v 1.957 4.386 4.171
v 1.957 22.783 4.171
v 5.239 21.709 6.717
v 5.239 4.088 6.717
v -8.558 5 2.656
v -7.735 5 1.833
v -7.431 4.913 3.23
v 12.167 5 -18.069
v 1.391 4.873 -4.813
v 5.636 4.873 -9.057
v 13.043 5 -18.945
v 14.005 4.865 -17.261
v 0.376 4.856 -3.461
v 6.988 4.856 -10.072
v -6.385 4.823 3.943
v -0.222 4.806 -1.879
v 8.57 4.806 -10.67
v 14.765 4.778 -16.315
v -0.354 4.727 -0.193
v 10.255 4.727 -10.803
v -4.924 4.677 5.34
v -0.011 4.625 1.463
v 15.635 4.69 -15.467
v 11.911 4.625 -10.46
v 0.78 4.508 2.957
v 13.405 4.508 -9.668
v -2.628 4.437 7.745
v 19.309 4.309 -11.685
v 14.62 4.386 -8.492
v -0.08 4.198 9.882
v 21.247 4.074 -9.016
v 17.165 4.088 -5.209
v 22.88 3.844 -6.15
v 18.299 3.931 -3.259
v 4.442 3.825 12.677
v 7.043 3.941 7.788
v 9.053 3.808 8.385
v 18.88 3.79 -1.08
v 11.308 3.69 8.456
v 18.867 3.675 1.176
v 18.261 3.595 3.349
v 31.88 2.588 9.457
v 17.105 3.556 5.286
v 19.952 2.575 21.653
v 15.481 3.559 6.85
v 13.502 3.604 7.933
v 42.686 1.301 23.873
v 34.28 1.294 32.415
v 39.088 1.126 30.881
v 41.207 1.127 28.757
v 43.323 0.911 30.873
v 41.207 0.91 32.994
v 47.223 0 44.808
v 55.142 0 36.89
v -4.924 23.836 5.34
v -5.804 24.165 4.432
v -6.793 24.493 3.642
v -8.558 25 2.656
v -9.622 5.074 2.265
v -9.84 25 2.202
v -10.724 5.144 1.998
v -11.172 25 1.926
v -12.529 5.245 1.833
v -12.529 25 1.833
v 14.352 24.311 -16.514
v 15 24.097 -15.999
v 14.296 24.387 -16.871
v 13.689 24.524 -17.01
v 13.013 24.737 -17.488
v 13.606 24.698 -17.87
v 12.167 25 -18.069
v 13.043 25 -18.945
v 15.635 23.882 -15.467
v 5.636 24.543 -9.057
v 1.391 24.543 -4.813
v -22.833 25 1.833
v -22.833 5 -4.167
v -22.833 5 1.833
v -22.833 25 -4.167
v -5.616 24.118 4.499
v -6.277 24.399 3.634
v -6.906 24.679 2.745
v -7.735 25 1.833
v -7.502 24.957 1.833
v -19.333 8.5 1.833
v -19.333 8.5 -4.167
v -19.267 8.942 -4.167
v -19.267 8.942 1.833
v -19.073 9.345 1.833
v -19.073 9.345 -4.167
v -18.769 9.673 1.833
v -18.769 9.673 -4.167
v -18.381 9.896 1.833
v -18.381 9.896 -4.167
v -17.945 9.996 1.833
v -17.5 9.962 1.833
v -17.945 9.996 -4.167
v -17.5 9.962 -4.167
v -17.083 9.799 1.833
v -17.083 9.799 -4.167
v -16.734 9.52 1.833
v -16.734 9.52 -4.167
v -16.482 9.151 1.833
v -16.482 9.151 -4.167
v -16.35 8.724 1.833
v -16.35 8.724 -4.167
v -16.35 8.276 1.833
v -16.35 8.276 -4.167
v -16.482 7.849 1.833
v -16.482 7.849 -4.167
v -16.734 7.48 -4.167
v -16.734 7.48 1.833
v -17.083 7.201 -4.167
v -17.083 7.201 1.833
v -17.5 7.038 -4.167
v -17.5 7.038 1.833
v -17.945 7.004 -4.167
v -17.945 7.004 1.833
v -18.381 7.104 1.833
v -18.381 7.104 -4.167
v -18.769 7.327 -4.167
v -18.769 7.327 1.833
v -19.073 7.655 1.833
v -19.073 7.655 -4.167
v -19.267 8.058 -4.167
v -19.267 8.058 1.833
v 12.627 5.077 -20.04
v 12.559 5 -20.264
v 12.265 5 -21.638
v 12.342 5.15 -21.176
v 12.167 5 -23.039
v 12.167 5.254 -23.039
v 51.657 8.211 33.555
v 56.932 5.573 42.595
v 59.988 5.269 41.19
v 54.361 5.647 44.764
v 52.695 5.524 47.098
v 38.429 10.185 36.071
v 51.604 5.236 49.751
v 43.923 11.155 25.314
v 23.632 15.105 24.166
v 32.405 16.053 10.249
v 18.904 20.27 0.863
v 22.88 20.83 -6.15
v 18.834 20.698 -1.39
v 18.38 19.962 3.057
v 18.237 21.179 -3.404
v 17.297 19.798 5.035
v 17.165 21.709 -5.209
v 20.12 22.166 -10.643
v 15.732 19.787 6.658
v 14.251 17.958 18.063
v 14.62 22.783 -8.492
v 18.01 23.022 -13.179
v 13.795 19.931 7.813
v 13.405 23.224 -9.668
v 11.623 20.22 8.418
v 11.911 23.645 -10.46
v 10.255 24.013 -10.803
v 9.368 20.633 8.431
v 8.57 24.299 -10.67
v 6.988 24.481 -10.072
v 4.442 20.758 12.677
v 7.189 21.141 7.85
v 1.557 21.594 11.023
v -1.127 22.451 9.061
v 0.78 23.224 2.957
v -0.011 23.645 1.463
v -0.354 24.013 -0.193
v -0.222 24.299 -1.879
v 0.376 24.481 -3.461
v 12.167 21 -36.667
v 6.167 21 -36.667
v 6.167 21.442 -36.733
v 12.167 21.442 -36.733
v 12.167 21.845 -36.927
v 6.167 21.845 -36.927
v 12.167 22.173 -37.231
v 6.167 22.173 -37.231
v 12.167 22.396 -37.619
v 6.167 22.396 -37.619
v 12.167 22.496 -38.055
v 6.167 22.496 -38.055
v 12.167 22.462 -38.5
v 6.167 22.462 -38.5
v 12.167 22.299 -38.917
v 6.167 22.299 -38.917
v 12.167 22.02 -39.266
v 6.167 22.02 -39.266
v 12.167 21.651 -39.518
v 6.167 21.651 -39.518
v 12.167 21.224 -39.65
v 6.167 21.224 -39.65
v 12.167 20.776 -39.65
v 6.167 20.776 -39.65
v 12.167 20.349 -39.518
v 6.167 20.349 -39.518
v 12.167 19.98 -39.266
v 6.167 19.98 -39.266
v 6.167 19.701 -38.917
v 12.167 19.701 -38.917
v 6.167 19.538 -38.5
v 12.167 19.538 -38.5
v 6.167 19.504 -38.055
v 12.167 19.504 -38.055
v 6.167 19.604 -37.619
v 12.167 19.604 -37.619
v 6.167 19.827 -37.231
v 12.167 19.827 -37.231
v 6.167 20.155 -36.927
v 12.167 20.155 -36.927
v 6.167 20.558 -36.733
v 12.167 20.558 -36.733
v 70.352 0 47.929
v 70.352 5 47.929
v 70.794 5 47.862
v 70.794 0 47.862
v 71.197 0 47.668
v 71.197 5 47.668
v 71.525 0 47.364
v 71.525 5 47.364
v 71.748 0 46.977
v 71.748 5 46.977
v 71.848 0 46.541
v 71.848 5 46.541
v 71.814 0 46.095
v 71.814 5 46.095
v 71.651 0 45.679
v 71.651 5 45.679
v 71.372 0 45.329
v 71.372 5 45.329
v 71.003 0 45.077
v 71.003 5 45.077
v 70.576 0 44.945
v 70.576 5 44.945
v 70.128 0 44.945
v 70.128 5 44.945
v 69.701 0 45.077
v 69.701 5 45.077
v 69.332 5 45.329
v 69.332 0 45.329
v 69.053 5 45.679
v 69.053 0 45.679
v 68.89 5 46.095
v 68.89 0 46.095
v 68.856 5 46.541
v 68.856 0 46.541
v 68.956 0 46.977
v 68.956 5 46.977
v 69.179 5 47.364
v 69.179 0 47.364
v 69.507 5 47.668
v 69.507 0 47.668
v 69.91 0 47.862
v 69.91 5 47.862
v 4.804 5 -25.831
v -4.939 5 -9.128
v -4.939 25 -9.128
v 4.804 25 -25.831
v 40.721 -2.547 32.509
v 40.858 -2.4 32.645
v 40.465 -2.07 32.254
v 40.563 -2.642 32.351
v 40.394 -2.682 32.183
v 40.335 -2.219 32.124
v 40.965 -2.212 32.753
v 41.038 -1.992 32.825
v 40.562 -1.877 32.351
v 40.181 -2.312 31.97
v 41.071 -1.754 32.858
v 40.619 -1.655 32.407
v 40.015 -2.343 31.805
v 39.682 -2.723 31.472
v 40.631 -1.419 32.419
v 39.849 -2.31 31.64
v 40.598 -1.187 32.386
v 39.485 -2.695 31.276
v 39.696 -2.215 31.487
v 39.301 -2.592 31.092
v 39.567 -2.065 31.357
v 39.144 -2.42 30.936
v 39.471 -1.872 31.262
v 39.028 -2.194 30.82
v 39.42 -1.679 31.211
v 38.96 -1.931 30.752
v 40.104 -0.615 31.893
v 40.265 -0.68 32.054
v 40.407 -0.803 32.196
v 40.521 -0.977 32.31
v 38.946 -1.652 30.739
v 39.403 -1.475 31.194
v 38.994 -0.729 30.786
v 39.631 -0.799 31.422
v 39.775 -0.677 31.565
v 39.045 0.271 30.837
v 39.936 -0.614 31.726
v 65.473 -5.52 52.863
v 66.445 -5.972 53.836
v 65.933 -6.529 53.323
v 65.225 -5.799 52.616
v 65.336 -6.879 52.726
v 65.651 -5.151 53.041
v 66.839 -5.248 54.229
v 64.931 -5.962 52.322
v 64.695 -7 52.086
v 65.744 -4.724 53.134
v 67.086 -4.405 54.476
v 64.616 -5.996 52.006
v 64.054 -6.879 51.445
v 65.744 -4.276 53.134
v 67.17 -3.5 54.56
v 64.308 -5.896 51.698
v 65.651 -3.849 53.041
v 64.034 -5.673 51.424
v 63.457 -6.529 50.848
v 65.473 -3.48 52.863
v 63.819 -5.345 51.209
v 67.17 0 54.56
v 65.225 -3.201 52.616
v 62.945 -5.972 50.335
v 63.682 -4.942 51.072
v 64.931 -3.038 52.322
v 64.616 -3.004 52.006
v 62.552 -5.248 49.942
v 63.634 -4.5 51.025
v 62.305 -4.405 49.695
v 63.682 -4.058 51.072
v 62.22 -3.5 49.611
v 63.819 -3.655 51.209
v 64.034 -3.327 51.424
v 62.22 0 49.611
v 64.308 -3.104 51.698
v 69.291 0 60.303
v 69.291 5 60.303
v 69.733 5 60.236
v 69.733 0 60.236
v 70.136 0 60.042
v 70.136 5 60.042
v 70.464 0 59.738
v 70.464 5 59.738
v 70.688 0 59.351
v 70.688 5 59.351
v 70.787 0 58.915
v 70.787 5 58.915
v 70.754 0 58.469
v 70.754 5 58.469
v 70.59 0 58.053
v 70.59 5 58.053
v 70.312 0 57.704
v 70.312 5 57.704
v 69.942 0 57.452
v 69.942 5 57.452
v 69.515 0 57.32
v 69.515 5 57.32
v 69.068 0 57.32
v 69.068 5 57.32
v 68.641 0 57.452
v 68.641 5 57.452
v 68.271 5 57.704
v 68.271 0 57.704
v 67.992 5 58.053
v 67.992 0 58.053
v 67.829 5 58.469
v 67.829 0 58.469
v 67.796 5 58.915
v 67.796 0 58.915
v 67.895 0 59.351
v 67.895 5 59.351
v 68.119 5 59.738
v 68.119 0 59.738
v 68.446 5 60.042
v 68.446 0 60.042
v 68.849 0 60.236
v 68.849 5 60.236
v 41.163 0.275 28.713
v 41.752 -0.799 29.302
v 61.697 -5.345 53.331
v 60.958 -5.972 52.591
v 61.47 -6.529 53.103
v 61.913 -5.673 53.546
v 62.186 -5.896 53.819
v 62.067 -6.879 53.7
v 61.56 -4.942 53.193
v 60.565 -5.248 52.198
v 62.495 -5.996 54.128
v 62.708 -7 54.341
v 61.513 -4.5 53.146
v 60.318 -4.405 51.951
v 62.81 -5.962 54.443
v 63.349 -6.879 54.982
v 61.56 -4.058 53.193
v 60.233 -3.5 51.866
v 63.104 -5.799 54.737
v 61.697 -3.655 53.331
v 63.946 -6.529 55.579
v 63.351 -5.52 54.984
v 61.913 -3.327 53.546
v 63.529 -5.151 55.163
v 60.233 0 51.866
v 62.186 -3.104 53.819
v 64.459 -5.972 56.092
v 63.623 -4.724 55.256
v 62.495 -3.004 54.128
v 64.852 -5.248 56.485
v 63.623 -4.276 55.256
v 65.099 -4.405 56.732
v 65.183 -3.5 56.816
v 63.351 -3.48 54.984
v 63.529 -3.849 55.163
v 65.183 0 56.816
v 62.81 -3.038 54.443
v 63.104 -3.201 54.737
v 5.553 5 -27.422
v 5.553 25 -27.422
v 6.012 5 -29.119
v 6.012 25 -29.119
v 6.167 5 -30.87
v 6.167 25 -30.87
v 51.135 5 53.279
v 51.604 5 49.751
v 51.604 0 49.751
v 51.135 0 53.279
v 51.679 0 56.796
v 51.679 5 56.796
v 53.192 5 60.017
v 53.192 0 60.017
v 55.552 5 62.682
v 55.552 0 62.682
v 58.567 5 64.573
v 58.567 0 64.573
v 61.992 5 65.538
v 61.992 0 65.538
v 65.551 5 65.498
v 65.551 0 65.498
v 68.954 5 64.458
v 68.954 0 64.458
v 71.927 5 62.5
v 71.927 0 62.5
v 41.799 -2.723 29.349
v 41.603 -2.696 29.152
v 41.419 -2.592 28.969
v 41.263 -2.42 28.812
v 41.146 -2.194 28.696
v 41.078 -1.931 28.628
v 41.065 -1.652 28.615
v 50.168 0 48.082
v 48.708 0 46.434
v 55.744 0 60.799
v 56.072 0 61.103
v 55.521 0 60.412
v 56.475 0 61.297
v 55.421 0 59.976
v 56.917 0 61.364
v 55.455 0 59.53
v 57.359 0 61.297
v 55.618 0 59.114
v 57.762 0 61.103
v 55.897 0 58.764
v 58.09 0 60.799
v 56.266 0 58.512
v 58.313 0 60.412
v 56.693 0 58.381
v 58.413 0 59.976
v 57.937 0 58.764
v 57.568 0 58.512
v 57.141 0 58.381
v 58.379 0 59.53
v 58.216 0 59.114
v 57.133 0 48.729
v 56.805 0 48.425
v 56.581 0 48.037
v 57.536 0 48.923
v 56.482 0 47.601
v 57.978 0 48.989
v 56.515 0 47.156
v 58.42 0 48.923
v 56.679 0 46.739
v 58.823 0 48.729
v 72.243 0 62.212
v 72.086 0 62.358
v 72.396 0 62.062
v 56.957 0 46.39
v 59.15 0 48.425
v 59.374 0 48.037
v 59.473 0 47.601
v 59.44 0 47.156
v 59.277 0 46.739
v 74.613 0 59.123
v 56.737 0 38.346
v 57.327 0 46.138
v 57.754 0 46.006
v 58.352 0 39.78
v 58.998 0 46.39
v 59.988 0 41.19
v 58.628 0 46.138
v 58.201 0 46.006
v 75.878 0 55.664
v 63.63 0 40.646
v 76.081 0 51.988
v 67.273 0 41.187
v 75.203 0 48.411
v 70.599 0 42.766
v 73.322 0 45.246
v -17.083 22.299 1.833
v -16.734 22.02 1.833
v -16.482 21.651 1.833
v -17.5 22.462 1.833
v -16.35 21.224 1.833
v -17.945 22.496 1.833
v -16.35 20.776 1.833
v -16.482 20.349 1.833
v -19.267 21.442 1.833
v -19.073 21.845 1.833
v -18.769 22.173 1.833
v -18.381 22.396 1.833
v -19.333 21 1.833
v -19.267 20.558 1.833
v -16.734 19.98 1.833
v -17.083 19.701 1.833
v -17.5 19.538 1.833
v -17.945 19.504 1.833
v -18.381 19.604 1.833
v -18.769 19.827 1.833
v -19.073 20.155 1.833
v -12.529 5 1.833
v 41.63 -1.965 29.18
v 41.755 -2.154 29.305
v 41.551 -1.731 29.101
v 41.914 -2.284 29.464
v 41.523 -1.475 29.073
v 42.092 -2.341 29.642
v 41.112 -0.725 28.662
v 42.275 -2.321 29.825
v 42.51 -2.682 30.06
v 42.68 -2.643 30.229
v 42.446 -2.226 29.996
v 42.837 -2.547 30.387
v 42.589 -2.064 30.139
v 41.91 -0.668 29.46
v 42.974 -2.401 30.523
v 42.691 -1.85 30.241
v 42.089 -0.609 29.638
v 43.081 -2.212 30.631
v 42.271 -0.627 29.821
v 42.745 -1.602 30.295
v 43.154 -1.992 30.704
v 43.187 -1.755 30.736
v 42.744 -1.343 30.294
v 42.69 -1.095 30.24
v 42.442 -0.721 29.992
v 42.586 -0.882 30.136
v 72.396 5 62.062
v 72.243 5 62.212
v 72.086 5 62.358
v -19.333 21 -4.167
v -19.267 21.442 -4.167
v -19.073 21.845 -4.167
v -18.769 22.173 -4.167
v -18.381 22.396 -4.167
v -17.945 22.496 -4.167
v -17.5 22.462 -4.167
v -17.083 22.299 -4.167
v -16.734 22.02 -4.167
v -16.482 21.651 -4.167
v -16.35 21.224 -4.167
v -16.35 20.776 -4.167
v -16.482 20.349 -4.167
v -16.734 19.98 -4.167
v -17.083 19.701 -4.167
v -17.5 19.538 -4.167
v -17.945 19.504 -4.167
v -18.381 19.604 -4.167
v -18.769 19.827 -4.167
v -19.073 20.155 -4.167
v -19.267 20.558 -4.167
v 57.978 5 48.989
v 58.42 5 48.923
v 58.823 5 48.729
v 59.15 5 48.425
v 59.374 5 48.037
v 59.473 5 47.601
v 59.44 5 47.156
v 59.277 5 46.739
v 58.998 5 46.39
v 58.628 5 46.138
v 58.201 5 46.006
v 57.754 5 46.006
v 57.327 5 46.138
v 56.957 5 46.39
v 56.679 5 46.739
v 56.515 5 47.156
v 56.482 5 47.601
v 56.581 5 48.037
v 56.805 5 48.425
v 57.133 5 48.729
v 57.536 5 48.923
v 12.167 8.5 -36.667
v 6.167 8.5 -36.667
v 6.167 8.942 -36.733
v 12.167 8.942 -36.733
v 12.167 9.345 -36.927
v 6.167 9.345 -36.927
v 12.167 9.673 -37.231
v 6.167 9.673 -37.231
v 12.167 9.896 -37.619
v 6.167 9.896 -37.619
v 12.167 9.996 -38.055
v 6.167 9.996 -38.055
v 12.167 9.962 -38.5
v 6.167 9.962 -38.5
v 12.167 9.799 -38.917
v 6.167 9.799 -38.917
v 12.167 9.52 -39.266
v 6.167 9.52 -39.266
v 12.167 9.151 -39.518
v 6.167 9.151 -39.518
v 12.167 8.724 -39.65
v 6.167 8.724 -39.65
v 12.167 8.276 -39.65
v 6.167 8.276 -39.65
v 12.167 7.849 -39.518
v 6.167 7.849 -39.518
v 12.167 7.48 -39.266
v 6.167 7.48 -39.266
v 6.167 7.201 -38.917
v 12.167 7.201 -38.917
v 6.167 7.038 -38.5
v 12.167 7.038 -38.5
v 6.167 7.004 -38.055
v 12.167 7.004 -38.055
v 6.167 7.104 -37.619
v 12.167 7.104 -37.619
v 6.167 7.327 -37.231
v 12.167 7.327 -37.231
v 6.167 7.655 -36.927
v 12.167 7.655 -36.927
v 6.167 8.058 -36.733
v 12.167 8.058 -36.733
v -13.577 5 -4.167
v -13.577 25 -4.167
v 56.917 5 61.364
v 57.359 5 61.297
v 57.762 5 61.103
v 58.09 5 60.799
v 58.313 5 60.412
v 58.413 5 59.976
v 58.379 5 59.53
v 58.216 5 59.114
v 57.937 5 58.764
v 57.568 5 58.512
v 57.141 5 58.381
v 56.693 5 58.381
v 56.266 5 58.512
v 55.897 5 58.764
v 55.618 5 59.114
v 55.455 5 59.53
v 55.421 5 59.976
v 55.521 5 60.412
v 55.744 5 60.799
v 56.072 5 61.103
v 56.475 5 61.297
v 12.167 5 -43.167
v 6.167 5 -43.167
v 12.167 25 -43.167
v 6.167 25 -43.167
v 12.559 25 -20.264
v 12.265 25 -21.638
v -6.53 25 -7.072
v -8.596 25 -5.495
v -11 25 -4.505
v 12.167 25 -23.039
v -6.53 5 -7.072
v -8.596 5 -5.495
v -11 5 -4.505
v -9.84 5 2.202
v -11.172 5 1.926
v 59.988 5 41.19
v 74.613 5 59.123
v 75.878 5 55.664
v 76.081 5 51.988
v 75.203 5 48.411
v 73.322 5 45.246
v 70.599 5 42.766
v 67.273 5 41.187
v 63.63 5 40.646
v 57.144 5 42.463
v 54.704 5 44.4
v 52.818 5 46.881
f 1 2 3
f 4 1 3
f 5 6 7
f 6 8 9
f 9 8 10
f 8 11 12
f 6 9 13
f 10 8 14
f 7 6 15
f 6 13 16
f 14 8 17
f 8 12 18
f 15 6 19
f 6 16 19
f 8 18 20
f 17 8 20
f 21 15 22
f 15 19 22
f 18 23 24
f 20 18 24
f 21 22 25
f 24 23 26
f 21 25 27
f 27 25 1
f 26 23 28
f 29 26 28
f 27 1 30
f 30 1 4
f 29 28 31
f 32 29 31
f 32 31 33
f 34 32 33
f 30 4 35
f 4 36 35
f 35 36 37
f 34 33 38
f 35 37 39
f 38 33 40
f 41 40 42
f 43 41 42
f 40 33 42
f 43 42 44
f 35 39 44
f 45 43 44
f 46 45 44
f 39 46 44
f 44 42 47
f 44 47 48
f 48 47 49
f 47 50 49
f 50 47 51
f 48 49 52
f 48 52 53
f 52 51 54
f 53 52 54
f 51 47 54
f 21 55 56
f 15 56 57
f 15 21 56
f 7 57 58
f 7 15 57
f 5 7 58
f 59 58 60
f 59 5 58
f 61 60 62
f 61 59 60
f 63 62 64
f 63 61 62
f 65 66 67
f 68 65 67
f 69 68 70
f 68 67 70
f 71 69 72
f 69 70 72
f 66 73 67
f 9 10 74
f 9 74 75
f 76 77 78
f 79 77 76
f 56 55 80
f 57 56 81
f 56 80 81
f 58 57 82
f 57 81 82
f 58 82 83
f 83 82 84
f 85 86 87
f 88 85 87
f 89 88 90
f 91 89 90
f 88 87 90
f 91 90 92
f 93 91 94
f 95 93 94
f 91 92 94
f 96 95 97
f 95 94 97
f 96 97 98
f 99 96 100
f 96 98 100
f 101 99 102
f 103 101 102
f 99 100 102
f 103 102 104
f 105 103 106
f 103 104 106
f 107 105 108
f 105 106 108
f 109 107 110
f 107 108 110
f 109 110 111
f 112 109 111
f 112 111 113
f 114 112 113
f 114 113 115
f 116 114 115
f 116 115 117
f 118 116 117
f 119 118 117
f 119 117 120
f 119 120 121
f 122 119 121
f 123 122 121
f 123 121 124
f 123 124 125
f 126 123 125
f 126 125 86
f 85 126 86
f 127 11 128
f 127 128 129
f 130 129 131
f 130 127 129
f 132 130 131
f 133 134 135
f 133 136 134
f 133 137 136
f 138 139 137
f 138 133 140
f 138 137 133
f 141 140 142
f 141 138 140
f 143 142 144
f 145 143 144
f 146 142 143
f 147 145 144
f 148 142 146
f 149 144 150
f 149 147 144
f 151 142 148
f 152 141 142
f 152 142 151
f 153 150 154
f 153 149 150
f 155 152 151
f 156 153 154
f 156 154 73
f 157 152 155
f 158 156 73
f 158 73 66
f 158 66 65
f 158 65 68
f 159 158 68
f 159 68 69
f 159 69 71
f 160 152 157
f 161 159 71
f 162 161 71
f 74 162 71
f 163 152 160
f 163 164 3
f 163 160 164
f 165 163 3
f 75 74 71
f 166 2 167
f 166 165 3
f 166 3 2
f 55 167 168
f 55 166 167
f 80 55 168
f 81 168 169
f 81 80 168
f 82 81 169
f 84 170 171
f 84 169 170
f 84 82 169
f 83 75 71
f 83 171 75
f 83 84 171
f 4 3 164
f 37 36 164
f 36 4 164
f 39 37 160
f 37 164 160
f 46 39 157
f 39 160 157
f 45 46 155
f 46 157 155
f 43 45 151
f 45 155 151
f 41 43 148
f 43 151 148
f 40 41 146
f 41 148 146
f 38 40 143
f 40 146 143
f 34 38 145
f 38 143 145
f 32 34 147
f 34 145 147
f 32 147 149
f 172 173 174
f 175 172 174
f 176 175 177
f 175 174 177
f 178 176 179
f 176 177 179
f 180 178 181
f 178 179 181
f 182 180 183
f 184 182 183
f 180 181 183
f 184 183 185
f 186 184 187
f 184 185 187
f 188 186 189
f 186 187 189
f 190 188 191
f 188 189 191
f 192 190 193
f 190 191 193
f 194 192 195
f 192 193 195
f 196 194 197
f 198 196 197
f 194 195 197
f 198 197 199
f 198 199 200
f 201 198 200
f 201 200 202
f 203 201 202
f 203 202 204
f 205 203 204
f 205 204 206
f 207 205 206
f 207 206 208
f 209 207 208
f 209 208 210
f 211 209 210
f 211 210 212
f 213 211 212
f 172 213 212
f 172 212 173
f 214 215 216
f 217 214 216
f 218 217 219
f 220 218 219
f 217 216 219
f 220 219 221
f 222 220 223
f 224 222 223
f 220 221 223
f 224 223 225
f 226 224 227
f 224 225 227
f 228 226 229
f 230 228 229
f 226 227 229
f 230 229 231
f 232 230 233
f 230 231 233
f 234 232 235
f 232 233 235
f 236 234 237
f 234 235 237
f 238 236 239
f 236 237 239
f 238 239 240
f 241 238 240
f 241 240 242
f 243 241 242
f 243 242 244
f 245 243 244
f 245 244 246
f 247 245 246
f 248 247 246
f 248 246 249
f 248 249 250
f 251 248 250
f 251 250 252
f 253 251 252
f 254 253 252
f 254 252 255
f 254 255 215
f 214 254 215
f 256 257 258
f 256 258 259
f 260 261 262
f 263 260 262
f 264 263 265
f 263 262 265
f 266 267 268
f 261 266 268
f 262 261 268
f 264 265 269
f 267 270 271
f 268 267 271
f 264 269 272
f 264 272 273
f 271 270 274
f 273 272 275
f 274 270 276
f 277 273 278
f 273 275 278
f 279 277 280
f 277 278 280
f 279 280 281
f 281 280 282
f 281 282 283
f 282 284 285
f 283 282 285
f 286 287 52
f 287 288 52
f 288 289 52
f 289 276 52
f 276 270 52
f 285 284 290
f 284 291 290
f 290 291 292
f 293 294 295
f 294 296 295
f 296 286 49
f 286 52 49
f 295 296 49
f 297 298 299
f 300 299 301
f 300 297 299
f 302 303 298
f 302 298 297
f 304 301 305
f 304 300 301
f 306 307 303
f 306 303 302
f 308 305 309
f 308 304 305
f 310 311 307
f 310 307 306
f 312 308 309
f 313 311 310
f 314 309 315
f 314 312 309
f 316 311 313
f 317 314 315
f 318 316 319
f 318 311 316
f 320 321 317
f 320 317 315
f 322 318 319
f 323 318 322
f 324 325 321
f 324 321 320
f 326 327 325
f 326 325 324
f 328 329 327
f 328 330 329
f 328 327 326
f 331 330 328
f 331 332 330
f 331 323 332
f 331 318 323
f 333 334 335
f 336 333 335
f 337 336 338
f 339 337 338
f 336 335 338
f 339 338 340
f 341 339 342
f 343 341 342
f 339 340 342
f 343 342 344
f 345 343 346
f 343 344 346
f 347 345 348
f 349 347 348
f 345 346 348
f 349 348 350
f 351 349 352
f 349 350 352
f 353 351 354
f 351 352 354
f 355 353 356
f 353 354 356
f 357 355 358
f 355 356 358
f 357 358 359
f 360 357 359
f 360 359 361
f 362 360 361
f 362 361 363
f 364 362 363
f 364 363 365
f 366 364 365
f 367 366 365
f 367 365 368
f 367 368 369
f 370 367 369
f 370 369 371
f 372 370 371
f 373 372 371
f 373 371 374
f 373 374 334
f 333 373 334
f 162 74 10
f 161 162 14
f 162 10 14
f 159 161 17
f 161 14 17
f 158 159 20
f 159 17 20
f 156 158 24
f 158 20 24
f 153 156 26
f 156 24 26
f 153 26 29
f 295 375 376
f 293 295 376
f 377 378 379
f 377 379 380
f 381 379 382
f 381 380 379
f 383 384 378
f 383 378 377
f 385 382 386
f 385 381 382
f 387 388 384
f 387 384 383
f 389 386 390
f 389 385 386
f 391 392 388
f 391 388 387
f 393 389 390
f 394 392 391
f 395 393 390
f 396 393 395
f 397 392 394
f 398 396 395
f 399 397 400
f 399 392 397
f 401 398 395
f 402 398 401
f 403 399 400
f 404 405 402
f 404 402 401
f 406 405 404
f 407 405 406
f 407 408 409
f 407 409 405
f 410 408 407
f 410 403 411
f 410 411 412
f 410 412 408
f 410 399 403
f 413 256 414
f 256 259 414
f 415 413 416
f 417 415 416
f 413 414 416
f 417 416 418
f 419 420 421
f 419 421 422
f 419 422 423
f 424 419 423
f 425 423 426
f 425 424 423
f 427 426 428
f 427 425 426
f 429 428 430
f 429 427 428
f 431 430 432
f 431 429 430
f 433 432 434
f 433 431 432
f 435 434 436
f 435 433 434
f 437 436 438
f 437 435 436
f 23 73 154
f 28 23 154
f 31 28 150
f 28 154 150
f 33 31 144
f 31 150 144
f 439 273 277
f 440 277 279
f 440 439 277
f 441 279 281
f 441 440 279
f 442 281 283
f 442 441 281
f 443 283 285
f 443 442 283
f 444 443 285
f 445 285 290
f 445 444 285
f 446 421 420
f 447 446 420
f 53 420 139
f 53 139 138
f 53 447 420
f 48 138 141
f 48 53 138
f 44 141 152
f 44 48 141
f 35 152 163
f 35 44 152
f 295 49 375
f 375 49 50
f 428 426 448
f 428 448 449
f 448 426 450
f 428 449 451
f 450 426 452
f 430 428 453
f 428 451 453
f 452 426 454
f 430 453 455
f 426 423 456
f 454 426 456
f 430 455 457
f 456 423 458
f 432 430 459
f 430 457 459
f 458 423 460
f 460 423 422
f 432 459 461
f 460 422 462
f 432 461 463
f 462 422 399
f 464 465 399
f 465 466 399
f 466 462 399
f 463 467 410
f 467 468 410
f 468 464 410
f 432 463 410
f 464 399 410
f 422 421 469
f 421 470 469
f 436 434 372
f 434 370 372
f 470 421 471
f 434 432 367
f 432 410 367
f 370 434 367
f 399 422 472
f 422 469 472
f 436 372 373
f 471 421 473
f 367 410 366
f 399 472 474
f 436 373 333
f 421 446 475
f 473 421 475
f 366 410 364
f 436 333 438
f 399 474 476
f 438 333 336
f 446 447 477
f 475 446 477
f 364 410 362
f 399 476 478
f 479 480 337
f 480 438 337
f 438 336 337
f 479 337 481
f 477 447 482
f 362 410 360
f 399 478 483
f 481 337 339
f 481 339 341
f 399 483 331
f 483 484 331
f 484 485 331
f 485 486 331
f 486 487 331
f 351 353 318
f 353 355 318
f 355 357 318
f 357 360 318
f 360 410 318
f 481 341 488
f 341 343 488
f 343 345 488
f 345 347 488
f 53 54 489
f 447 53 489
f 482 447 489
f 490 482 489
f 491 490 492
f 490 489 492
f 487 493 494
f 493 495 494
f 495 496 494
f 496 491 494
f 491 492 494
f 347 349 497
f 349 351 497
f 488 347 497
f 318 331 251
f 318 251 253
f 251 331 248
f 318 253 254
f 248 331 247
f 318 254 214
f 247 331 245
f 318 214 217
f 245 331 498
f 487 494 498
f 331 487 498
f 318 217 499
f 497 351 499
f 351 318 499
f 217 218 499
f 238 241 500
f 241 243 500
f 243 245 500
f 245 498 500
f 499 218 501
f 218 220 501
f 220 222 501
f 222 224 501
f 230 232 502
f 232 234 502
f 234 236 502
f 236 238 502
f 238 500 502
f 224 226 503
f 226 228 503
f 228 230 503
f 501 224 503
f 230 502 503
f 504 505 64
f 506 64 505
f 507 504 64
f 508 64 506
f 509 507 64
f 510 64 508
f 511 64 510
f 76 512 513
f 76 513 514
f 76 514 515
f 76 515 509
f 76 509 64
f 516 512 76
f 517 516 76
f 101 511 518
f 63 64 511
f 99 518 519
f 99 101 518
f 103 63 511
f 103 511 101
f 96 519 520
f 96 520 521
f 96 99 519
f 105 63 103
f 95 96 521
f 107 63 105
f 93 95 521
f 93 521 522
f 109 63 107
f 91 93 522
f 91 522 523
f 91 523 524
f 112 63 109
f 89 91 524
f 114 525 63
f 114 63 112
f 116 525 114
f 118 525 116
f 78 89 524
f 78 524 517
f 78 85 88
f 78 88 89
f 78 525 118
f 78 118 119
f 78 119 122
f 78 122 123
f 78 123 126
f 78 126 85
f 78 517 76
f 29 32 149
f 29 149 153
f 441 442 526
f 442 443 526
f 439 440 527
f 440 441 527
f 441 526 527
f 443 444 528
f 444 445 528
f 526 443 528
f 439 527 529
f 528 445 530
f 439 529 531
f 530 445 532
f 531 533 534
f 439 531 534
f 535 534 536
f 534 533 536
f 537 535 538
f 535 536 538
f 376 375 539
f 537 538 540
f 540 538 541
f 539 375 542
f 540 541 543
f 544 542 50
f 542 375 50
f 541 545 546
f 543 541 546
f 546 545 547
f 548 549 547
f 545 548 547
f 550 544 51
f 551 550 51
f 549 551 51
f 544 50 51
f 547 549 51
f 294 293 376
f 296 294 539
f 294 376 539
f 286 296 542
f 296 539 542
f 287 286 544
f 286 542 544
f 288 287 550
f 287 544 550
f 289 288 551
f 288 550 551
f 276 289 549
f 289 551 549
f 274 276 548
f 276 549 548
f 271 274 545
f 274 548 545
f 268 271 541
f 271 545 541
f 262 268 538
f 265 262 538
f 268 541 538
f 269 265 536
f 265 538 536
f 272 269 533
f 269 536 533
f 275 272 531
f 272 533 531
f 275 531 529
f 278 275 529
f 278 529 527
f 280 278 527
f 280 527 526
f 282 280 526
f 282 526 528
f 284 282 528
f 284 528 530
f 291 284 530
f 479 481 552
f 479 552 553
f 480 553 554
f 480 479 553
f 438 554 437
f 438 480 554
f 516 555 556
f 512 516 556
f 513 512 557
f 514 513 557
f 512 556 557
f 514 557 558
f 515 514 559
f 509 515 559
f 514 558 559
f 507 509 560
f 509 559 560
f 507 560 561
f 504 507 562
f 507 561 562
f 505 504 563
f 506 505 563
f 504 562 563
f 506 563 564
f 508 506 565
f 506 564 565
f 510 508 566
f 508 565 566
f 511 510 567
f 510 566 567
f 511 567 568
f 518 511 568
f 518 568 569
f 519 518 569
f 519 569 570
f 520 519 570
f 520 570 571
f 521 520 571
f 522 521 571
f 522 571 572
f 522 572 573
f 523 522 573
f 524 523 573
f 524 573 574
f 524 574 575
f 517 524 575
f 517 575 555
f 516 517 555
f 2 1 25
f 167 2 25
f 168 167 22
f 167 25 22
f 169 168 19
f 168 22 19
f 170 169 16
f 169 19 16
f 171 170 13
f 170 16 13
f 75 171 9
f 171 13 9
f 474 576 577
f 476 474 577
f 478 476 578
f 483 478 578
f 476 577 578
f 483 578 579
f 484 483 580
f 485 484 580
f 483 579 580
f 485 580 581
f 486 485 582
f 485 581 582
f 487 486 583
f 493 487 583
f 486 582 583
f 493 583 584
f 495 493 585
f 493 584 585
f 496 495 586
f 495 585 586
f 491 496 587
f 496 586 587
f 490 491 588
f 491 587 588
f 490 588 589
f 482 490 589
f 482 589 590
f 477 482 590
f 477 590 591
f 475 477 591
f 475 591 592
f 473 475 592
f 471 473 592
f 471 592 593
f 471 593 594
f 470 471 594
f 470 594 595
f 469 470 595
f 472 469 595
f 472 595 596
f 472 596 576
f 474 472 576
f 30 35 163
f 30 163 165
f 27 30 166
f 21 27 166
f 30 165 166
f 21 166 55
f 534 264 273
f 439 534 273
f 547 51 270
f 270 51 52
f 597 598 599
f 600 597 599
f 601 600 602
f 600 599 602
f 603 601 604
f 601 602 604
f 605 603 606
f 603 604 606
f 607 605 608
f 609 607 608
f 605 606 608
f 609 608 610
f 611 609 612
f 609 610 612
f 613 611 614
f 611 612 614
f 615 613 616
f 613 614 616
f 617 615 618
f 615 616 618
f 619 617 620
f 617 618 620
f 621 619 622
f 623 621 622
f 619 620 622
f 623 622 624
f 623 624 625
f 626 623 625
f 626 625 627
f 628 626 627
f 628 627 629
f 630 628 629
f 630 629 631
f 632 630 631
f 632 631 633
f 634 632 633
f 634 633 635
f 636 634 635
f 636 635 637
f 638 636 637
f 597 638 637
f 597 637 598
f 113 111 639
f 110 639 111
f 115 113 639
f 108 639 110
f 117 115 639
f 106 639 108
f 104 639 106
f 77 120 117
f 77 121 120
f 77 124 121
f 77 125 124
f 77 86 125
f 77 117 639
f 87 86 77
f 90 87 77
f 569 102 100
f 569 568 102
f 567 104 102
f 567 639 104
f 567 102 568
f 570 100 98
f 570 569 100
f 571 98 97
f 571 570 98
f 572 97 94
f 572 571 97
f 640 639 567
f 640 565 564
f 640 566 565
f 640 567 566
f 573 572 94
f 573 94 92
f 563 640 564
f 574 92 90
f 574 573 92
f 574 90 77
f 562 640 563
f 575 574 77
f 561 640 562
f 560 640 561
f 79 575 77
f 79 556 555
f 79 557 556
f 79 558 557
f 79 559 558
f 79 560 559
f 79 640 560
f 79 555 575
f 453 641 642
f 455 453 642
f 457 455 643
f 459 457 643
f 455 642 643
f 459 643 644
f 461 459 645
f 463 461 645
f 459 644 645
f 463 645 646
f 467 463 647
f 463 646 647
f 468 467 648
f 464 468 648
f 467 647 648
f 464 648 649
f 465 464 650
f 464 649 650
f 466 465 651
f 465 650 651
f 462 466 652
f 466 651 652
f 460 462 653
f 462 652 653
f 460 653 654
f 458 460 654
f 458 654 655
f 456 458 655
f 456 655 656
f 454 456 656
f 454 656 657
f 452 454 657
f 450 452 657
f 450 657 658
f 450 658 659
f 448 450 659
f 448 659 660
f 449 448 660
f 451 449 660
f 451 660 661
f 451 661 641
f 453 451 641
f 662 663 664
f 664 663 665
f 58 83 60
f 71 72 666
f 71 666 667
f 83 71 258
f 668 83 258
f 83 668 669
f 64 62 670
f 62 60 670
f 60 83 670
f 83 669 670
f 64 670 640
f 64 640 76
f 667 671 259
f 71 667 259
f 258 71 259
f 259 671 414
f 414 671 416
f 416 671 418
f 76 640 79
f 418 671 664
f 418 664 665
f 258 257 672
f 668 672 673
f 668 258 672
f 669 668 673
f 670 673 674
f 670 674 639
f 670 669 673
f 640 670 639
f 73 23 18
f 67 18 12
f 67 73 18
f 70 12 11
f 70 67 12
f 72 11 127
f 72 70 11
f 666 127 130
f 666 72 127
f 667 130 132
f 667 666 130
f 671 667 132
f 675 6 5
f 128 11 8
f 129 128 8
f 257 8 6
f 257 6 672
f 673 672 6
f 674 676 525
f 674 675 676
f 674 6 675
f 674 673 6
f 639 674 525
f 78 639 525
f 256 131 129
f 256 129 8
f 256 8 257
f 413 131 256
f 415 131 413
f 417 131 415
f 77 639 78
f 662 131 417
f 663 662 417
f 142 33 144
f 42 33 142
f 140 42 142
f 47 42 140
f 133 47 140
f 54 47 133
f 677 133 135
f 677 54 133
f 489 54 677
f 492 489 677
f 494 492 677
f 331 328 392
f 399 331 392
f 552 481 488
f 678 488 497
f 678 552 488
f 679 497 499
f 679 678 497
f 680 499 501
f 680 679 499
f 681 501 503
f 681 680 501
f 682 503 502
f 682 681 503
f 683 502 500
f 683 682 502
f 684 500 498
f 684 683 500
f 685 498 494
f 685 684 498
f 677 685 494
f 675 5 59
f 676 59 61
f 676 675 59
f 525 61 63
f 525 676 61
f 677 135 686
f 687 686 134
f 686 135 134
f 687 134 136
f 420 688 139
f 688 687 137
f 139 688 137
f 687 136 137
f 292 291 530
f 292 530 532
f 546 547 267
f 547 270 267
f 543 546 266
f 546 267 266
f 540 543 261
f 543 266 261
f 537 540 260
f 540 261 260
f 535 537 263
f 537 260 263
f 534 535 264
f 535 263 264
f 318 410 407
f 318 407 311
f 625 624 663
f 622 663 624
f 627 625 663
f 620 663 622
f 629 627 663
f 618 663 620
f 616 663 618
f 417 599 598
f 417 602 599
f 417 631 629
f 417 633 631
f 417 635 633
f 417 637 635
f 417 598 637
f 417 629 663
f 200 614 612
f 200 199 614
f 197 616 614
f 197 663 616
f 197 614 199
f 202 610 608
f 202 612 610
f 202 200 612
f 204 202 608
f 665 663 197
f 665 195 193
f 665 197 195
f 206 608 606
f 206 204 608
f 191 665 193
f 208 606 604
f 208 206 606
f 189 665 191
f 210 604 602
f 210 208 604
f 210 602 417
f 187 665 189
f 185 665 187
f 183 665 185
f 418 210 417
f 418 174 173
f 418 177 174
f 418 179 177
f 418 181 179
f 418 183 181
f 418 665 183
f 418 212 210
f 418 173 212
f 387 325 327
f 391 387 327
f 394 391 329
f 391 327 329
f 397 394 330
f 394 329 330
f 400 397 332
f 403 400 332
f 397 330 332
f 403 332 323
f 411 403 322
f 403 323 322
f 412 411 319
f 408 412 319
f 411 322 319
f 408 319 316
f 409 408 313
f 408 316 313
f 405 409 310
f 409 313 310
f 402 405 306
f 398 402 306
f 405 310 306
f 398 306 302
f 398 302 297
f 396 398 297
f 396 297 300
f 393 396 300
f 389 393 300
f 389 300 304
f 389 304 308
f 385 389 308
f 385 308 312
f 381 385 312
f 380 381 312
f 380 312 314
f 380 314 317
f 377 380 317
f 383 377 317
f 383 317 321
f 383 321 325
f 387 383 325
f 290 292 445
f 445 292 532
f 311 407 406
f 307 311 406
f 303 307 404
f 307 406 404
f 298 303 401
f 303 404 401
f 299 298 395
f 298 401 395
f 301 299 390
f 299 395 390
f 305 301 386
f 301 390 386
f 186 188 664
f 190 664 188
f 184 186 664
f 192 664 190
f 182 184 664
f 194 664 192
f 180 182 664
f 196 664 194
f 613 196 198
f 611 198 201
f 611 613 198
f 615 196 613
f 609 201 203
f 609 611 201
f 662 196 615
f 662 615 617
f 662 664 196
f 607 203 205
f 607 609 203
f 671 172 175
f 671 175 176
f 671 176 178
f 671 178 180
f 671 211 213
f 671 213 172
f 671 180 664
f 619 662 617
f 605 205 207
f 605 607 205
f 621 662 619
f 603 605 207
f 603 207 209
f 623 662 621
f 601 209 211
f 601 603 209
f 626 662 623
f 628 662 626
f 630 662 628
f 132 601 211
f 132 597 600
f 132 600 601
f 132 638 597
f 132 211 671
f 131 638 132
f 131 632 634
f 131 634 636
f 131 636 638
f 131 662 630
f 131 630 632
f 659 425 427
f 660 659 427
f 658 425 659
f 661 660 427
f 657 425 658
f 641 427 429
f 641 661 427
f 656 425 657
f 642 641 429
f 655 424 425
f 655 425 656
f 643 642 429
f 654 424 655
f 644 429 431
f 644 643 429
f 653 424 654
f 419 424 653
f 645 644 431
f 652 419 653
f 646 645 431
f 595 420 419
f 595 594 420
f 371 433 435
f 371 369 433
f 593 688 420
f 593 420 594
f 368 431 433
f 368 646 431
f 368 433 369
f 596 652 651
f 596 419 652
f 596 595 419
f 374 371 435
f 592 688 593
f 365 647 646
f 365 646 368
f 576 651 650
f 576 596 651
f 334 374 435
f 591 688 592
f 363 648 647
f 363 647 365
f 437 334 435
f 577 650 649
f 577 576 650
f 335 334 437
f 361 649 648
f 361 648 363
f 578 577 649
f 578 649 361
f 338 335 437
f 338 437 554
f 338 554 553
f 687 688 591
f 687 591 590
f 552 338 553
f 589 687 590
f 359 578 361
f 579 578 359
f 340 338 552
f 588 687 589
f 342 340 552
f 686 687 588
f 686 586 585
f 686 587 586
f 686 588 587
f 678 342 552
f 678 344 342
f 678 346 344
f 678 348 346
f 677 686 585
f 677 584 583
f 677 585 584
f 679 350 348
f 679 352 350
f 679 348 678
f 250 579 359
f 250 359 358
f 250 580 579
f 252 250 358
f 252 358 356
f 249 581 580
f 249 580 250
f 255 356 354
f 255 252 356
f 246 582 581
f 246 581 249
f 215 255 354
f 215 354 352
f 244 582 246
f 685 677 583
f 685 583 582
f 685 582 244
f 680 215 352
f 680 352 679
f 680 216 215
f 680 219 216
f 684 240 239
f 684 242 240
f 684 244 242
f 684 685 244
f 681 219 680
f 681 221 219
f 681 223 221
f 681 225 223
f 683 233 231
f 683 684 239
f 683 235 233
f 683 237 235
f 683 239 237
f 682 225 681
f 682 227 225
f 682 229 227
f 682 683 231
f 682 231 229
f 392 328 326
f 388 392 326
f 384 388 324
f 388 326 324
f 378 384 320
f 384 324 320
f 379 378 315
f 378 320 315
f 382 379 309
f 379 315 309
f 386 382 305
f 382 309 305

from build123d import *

# Parameters (mm, degrees)
BOSS_EXTRUDE3_DEPTH     = 25
FILLET2_R               = 30
SKETCH2_R               = 1.5
CUT_EXTRUDE1_DEPTH      = 25
SKETCH3_R               = 1.5
CUT_EXTRUDE2_DEPTH      = 25
CUT_EXTRUDE4_DEPTH      = 25
FILLET3_R               = 6
BOSS_EXTRUDE4_DEPTH     = 25
CUT_EXTRUDE6_DEPTH      = 100
CUT_EXTRUDE6_DEPTH_BACK = 100
SKETCH10_W              = 160.183879056
SKETCH10_H              = 83.114276869
SKETCH11_R              = 12.5
BOSS_EXTRUDE5_DEPTH     = 5
CUT_EXTRUDE7_START      = 100
SKETCH12_R              = 12.5
CUT_EXTRUDE7_DEPTH      = 100
FILLET5_R               = 10
BOSS_EXTRUDE9_DEPTH     = 20
CUT_EXTRUDE9_DEPTH      = 100
SKETCH15_W              = 10
SKETCH15_H              = 5
CUT_EXTRUDE10_DEPTH     = 100
SKETCH16_R              = 1.5
CUT_EXTRUDE11_DEPTH     = 10
SKETCH17_R              = 1.5
CUT_EXTRUDE12_DEPTH     = 10
FILLET7_R               = 10
SKETCH18_R              = 1.5
CUT_EXTRUDE14_DEPTH     = 10
BOSS_EXTRUDE10_DEPTH    = 7
SKETCH21_R              = 1.5
CUT_EXTRUDE15_DEPTH     = 7
FILLET8_R               = 3.5
BOSS_EXTRUDE13_DEPTH    = 5
CUT_EXTRUDE16_DEPTH     = 5
CUT_EXTRUDE18_DEPTH     = 5
FILLET10_R              = 1
BOSS_EXTRUDE14_START    = 1
SKETCH27_W              = 15
SKETCH27_H              = 20
SKETCH27_R              = 1.5
BOSS_EXTRUDE14_DEPTH    = 1
BOSS_EXTRUDE15_START    = 1
SKETCH28_W              = 15
SKETCH28_H              = 20
SKETCH28_R              = 1.5
BOSS_EXTRUDE15_DEPTH    = 1
BOSS_EXTRUDE16_DEPTH    = 20
FILLET11_R              = 10


with BuildPart() as part:
    # Sketch1 → Boss-Extrude3 (new body)
    with BuildSketch(Plane(origin=(0, 0, 0), x_dir=(1, 0, 0), z_dir=(0, 1, 0))):
        with BuildLine():
            Line((-32.833333333, 3.166666667), (-17.833333333, 3.166666667))
            Line((-17.833333333, 3.166666667), (7.166666667, 18.166666667))
            Line((7.166666667, 18.166666667), (7.166666667, 33.166666667))
            Line((7.166666667, 33.166666667), (12.166666667, 33.166666667))
            Line((12.166666667, 33.166666667), (12.166666667, 18.166666667))
            Line((12.166666667, 18.166666667), (17.527177031, 18.166666667))
            ThreePointArc((17.527177031, 18.166666667), (37.442198793, -17.327342211), (66.165661867, -46.161270611))
            ThreePointArc((66.165661867, -46.161270611), (72.395526252, -62.062192918), (56.494603945, -55.832328533))
            ThreePointArc((56.494603945, -55.832328533), (27.660675544, -27.10886546), (-7.833333333, -7.193843698))
            Line((-7.833333333, -7.193843698), (-7.833333333, -1.833333333))
            Line((-7.833333333, -1.833333333), (-32.833333333, -1.833333333))
            Line((-32.833333333, -1.833333333), (-32.833333333, 3.166666667))
        make_face()
    extrude(amount=BOSS_EXTRUDE3_DEPTH)

    # Chamfer2
    # the kernel refuses this chamfer: 6, 5.627229018 mm, written as the material it takes off along each edge
    with BuildSketch(Plane(origin=(17.527177031, -14.820831596, -18.166666667), x_dir=(-0.9997164223008481, 0, -0.023813336221376217), z_dir=(0, 1, 0))) as chamfer2_piece_1_section:
        with BuildLine():
            Line((5.702702936, 0), (-2.525905891, 5.363294445))
            Line((-2.525905891, 5.363294445), (-2.634618021, 5.31248428))
            ThreePointArc((-2.634618021, 5.31248428), (-1.288030314, 2.670484416), (-0.110572005, -0.046624369))
            Line((-0.110572005, -0.046624369), (0.0028576, -0.119965971))
            ThreePointArc((0.0028576, -0.119965971), (2.852592138, -0.052085034), (5.705560536, -0.119965971))
            Line((5.705560536, -0.119965971), (5.702702936, 0))
        make_face()
    chamfer2_piece_1 = extrude(amount=54.641663192, mode=Mode.PRIVATE)
    chamfer2_piece_1 = split(chamfer2_piece_1, bisect_by=Plane(origin=(12.166666667, 12.5, -16.425975933), z_dir=(1, 0, 0)), keep=Keep.TOP, mode=Mode.PRIVATE)
    add(chamfer2_piece_1, mode=Mode.SUBTRACT)
    with BuildSketch(Plane(origin=(-7.833333333, -15.240510768, 7.193843698), x_dir=(-0.020819858729133396, 0, -0.999783243249505), z_dir=(0, 1, 0))) as chamfer2_piece_2_section:
        with BuildLine():
            Line((6.096204307, 0), (-2.361428154, -5.028621182))
            Line((-2.361428154, -5.028621182), (-2.470415157, -4.978403325))
            ThreePointArc((-2.470415157, -4.978403325), (-1.204815622, -2.503704319), (-0.110711113, 0.046293083))
            Line((-0.110711113, 0.046293083), (0.002498383, 0.119973989))
            ThreePointArc((0.002498383, 0.119973989), (3.049279286, 0.056526689), (6.09870269, 0.119973989))
            Line((6.09870269, 0.119973989), (6.096204307, 0))
        make_face()
    chamfer2_piece_2 = extrude(amount=55.481021536, mode=Mode.PRIVATE)
    chamfer2_piece_2 = split(chamfer2_piece_2, bisect_by=Plane(origin=(-6.193350631, 12.5, 1.833333333), z_dir=(0, 0, 1)), keep=Keep.TOP, mode=Mode.PRIVATE)
    add(chamfer2_piece_2, mode=Mode.SUBTRACT)

    # Fillet2
    # the kernel refuses this fillet: 30 mm, written as the material it takes off along each edge
    with BuildSketch(Plane(origin=(19.726764246, 45.355475944, -12.880543269), x_dir=(0.42429011681478046, 0, 0.9055263092662189), z_dir=(0, -1, 0))) as fillet2_piece_1:
        with BuildLine():
            CenterArc((8.176045785, 29.990790911), FILLET2_R, 239.5660286, 29.014271836)
            Line((-7.020306331, 4.124386399), (0, 0))
            ThreePointArc((0, 0), (3.716384448, 0.046045445), (7.432768895, 0))
        make_face()
    extrude(amount=65.710951888, mode=Mode.SUBTRACT)
    with BuildSketch(Plane(origin=(-2.883559651, 47.152983024, 9.246371963), x_dir=(0.9056360428972143, 0, 0.4240558427913414), z_dir=(0, -1, 0))) as fillet2_piece_2_section:
        with BuildLine():
            CenterArc((8.898038247, -29.989092358), FILLET2_R, 91.545096469, 31.436731661)
            Line((-7.433152225, -4.823794471), (0, 0))
            ThreePointArc((0, 0), (4.044562839, -0.05453821), (8.089125679, 0))
        make_face()
    fillet2_piece_2 = extrude(amount=69.305966049, mode=Mode.PRIVATE)
    fillet2_piece_2 = split(fillet2_piece_2, bisect_by=Plane(origin=(-2.472074329, 12.5, 1.833333333), z_dir=(0, 0, 1)), keep=Keep.TOP, mode=Mode.PRIVATE)
    add(fillet2_piece_2, mode=Mode.SUBTRACT)

    # Sketch2 → Cut-Extrude1 (cut)
    with BuildSketch(Plane.XY.offset(1.833333333)):
        with Locations((-27.833333333, 20)):
            Circle(SKETCH2_R)
        with Locations((-27.833333333, 7.5)):
            Circle(SKETCH2_R)
    extrude(amount=-CUT_EXTRUDE1_DEPTH, mode=Mode.SUBTRACT)

    # Sketch3 → Cut-Extrude2 (cut)
    with BuildSketch(Plane(origin=(12.166666667, 0, 0), x_dir=(0, 0, -1), z_dir=(1, 0, 0))):
        with Locations((28.166666667, 20)):
            Circle(SKETCH3_R)
        with Locations((28.166666667, 7.5)):
            Circle(SKETCH3_R)
    extrude(amount=-CUT_EXTRUDE2_DEPTH, mode=Mode.SUBTRACT)

    # Sketch4 → Cut-Extrude4 (cut)
    with BuildSketch(Plane(origin=(0, 25, 0), x_dir=(1, 0, 0), z_dir=(0, 1, 0))):
        with BuildLine():
            Line((17.165160832, 5.209143376), (10.448403781, 13.869842848))
            Line((10.448403781, 13.869842848), (-3.421439067, 0))
            Line((-3.421439067, 0), (5.239260404, -6.716757051))
            ThreePointArc((5.239260404, -6.716757051), (16.458811421, -6.01040764), (17.165160832, 5.209143376))
        make_face()
    extrude(amount=-CUT_EXTRUDE4_DEPTH, mode=Mode.SUBTRACT)

    # Fillet3
    fillet3_edges = [part.edges().sort_by_distance(p)[0] for p in [
        (-3.421439067, 12.5, 0),
        (10.448403781, 12.5, -13.869842848),
    ]]
    fillet(fillet3_edges, radius=FILLET3_R)

    # Sketch7 → Boss-Extrude4 (add)
    with BuildSketch(Plane(origin=(0, 25, 0), x_dir=(1, 0, 0), z_dir=(0, 1, 0))):
        Polygon((8.953526914, 27.464178608), (42.758807377, -6.341101855), (46.775588972, -2.324320261), (12.970308509, 31.480960203), align=None)
    extrude(amount=BOSS_EXTRUDE4_DEPTH)

    # Sketch10 → Cut-Extrude6 (cut, two sides: drawn at the far end of the back side and taken through both)
    with BuildSketch(Plane(origin=(22.225634356, 0, -22.225634356), x_dir=(-0.7071067811865475, 0, -0.7071067811865477), z_dir=(0.7071067811865477, 0, -0.7071067811865475)).offset(-CUT_EXTRUDE6_DEPTH_BACK)):
        with Locations((-36.711585848, 10.87638512)):
            Rectangle(SKETCH10_W, SKETCH10_H)
        Polygon((-95.075965008, 0), (-95.075965008, 5), (-72.575965008, 5), (4.173398499, 25), (18.384776311, 25), (25.455844123, 25), (25.455844123, 5), (18.384776311, 5), (4.173398499, 5), (-65.075965008, 0), align=None, mode=Mode.SUBTRACT)
    extrude(amount=CUT_EXTRUDE6_DEPTH + CUT_EXTRUDE6_DEPTH_BACK, mode=Mode.SUBTRACT)

    # Sketch11 → Boss-Extrude5 (add)
    with BuildSketch(Plane(origin=(0, 5, 0), x_dir=(1, 0, 0), z_dir=(0, 1, 0))):
        with Locations((63.634495769, -53.146232797)):
            Circle(SKETCH11_R)
    extrude(amount=-BOSS_EXTRUDE5_DEPTH)

    # Sketch12 → Cut-Extrude7 (cut)
    with BuildSketch(Plane(origin=(0, 5, 0), x_dir=(1, 0, 0), z_dir=(0, 1, 0)).offset(CUT_EXTRUDE7_START)):
        with Locations((63.634495769, -53.146232797)):
            Circle(SKETCH12_R)
    extrude(amount=-CUT_EXTRUDE7_DEPTH, mode=Mode.SUBTRACT)

    # Fillet5
    fillet5_edges = [part.edges().sort_by_distance(p)[0] for p in [
        (-17.833333333, 15, -3.166666667),
        (7.166666667, 15, -18.166666667),
    ]]
    fillet(fillet5_edges, radius=FILLET5_R)

    # Sketch13 → Boss-Extrude9 (add)
    with BuildSketch(Plane(origin=(0, 25, 0), x_dir=(1, 0, 0), z_dir=(0, 1, 0))):
        Polygon((-32.833333333, 3.166666667), (-7.833333333, 3.166666667), (7.166666667, 28.166666667), (7.166666667, 43.166666667), (12.166666667, 43.166666667), (12.166666667, 18.068743425), (-7.735410091, -1.833333333), (-32.833333333, -1.833333333), align=None)
    extrude(amount=-BOSS_EXTRUDE9_DEPTH)

    # Sketch14 → Cut-Extrude9 (cut)
    with BuildSketch(Plane(origin=(0, 25, 0), x_dir=(1, 0, 0), z_dir=(0, 1, 0))):
        Polygon((-23.490794192, 3.166666667), (-7.833333333, 3.166666667), (-1.163922491, 14.282351403), align=None)
    extrude(amount=-CUT_EXTRUDE9_DEPTH, mode=Mode.SUBTRACT)

    # Sketch15 → Cut-Extrude10 (cut)
    with BuildSketch(Plane(origin=(0, 25, 0), x_dir=(1, 0, 0), z_dir=(0, 1, 0))):
        with Locations((-27.833333333, 0.666666667)):
            Rectangle(SKETCH15_W, SKETCH15_H)
    extrude(amount=-CUT_EXTRUDE10_DEPTH, mode=Mode.SUBTRACT)

    # Sketch16 → Cut-Extrude11 (cut)
    with BuildSketch(Plane.ZY.offset(-7.166666667)):
        with Locations((-38.166666667, 21)):
            Circle(SKETCH16_R)
        with Locations((-38.166666667, 8.5)):
            Circle(SKETCH16_R)
    extrude(amount=-CUT_EXTRUDE11_DEPTH, mode=Mode.SUBTRACT)

    # Sketch17 → Cut-Extrude12 (cut)
    with BuildSketch(Plane(origin=(0, 0, -3.166666667), x_dir=(-1, 0, 0), z_dir=(0, 0, -1))):
        with Locations((17.833333333, 21)):
            Circle(SKETCH17_R)
        with Locations((17.833333333, 8.5)):
            Circle(SKETCH17_R)
    extrude(amount=-CUT_EXTRUDE12_DEPTH, mode=Mode.SUBTRACT)

    # Fillet7
    # the kernel refuses this fillet: 10 mm, written as the material it adds along each edge
    with BuildSketch(Plane(origin=(-7.502347281, -7.577664342, 1.833333333), x_dir=(-1, 0, 0), z_dir=(0, 1, 0))) as fillet7_piece_1_section:
        with BuildLine():
            CenterArc((5.026306118, 10), FILLET7_R, 220.490539219, 49.509460781)
            ThreePointArc((-2.578825815, 3.506775201), (-1.225726194, 1.80022178), (0, 0))
            Line((0, 0), (5.026306118, 0))
        make_face()
    fillet7_piece_1 = extrude(amount=45.100484579, mode=Mode.PRIVATE)
    fillet7_piece_1 = split(fillet7_piece_1, bisect_by=Plane(origin=(-6.299503341, 5, 3.722138351), z_dir=(0, -1, 0)), keep=Keep.TOP, mode=Mode.PRIVATE)
    fillet7_piece_1 = split(fillet7_piece_1, bisect_by=Plane(origin=(-6.303814006, 4.830696636, 3.717827687), z_dir=(0.05092254709852862, 0.9974035233515051, 0.05092254709852862)), keep=Keep.TOP, mode=Mode.PRIVATE)
    add(fillet7_piece_1)
    with BuildSketch(Plane(origin=(-7.502347281, -7.577664342, 1.833333333), x_dir=(-1, 0, 0), z_dir=(0, 1, 0))) as fillet7_piece_2_section:
        with BuildLine():
            CenterArc((5.026306118, 10), FILLET7_R, 220.490539219, 49.509460781)
            ThreePointArc((-2.578825815, 3.506775201), (-1.225726194, 1.80022178), (0, 0))
            Line((0, 0), (5.026306118, 0))
        make_face()
    fillet7_piece_2 = extrude(amount=45.100484579, mode=Mode.PRIVATE)
    fillet7_piece_2 = split(fillet7_piece_2, bisect_by=Plane(origin=(-10.467928875, 5, 1.847831753), z_dir=(0, 1, 0)), keep=Keep.TOP, mode=Mode.PRIVATE)
    fillet7_piece_2 = split(fillet7_piece_2, bisect_by=Plane(origin=(-10.464404817, 5.138408988, 1.85135581), z_dir=(-0.05092254709852862, -0.9974035233515051, -0.05092254709852862)), keep=Keep.TOP, mode=Mode.PRIVATE)
    add(fillet7_piece_2)
    with BuildSketch(Plane(origin=(-7.502347281, -7.577664342, 1.833333333), x_dir=(-1, 0, 0), z_dir=(0, 1, 0))) as fillet7_piece_3_section:
        with BuildLine():
            CenterArc((5.026306118, 10), FILLET7_R, 220.490539219, 49.509460781)
            ThreePointArc((-2.578825815, 3.506775201), (-1.225726194, 1.80022178), (0, 0))
            Line((0, 0), (5.026306118, 0))
        make_face()
    fillet7_piece_3 = extrude(amount=45.100484579, mode=Mode.PRIVATE)
    fillet7_piece_3 = split(fillet7_piece_3, bisect_by=Plane(origin=(-8.143046579, 25, 2.567869608), z_dir=(0, -1, 0)), keep=Keep.TOP, mode=Mode.PRIVATE)
    fillet7_piece_3 = split(fillet7_piece_3, bisect_by=Plane(origin=(-8.143046579, 5, 2.567869608), z_dir=(0, 1, 0)), keep=Keep.TOP, mode=Mode.PRIVATE)
    fillet7_piece_3 = split(fillet7_piece_3, bisect_by=Plane(origin=(-6.413698514, 24.302451402, 4.297217673), z_dir=(-0.17830914996233782, -0.9676836745958967, -0.17830914996233793)), keep=Keep.TOP, mode=Mode.PRIVATE)
    fillet7_piece_3 = split(fillet7_piece_3, bisect_by=Plane(origin=(-8.64759618, 5.034829767, 2.063320006), z_dir=(0.05092254709852862, 0.9974035233515051, 0.05092254709852862)), keep=Keep.TOP, mode=Mode.PRIVATE)
    add(fillet7_piece_3)
    with BuildSketch(Plane(origin=(12.166666667, 25, -18.068743425), x_dir=(0, 0, -1), z_dir=(0, -1, 0))) as fillet7_piece_4_section:
        with BuildLine():
            CenterArc((4.970504995, 10), FILLET7_R, 220.783942831, 49.216057169)
            Line((-2.601276479, 3.467915699), (-3.358454626, 2.814707269))
            ThreePointArc((-3.358454626, 2.814707269), (-1.405583009, 0.280875666), (-0.824518548, -0.565834927))
            Line((-0.824518548, -0.565834927), (0, -1))
            Line((0, -1), (4.970504995, -1))
            Line((4.970504995, -1), (4.970504995, 0))
        make_face()
    fillet7_piece_4 = extrude(amount=20, mode=Mode.PRIVATE)
    fillet7_piece_4 = split(fillet7_piece_4, bisect_by=Plane(origin=(14.359334309, 24.376039861, -16.875179681), z_dir=(-0.17830914996233782, -0.9676836745958967, -0.17830914996233793)), keep=Keep.TOP, mode=Mode.PRIVATE)
    fillet7_piece_4 = split(fillet7_piece_4, bisect_by=Plane(origin=(12.113566037, 5.056431477, -19.120947952), z_dir=(0.05092254709852862, 0.9974035233515051, 0.05092254709852862)), keep=Keep.TOP, mode=Mode.PRIVATE)
    add(fillet7_piece_4)
    with BuildSketch(Plane(origin=(12.166666667, 25, -18.068743425), x_dir=(0, 0, -1), z_dir=(0, -1, 0))) as fillet7_piece_5_section:
        with BuildLine():
            CenterArc((4.970504995, 10), FILLET7_R, 220.783942831, 49.216057169)
            Line((-2.601276479, 3.467915699), (-3.358454626, 2.814707269))
            ThreePointArc((-3.358454626, 2.814707269), (-1.405583009, 0.280875666), (-0.824518548, -0.565834927))
            Line((-0.824518548, -0.565834927), (0, -1))
            Line((0, -1), (4.970504995, -1))
            Line((4.970504995, -1), (4.970504995, 0))
        make_face()
    fillet7_piece_5 = extrude(amount=32.426262487, mode=Mode.PRIVATE)
    fillet7_piece_5 = split(fillet7_piece_5, bisect_by=Plane(origin=(14.100710146, 5, -16.202051862), z_dir=(0, -1, 0)), keep=Keep.TOP, mode=Mode.PRIVATE)
    fillet7_piece_5 = split(fillet7_piece_5, bisect_by=Plane(origin=(14.095782292, 4.806456237, -16.206979716), z_dir=(0.05092254709852862, 0.9974035233515051, 0.05092254709852862)), keep=Keep.TOP, mode=Mode.PRIVATE)
    add(fillet7_piece_5)
    with BuildSketch(Plane(origin=(12.166666667, 25, -18.068743425), x_dir=(0, 0, -1), z_dir=(0, -1, 0))) as fillet7_piece_6_section:
        with BuildLine():
            CenterArc((4.970504995, 10), FILLET7_R, 220.783942831, 49.216057169)
            Line((-2.601276479, 3.467915699), (-3.358454626, 2.814707269))
            ThreePointArc((-3.358454626, 2.814707269), (-1.405583009, 0.280875666), (-0.824518548, -0.565834927))
            Line((-0.824518548, -0.565834927), (0, -1))
            Line((0, -1), (4.970504995, -1))
            Line((4.970504995, -1), (4.970504995, 0))
        make_face()
    fillet7_piece_6 = extrude(amount=20, mode=Mode.PRIVATE)
    fillet7_piece_6 = split(fillet7_piece_6, bisect_by=Plane(origin=(11.727300313, 5.177477113, -21.105564101), z_dir=(-0.05092254709852862, -0.9974035233515051, -0.05092254709852862)), keep=Keep.TOP, mode=Mode.PRIVATE)
    add(fillet7_piece_6)

    # Sketch18 → Cut-Extrude14 (cut)
    with BuildSketch(Plane(origin=(0, 5, 0), x_dir=(1, 0, 0), z_dir=(0, 1, 0))):
        with Locations(Location((56.916981348, -59.863747218, 0), (0, 0, 270))):
            Circle(SKETCH18_R)
        with Locations(Location((70.35201019, -46.428718376, 0), (0, 0, 270))):
            Circle(SKETCH18_R)
        with Locations(Location((57.97764152, -47.489378547, 0), (0, 0, 270))):
            Circle(SKETCH18_R)
        with Locations(Location((69.291350019, -58.803087046, 0), (0, 0, 270))):
            Circle(SKETCH18_R)
    extrude(amount=-CUT_EXTRUDE14_DEPTH, mode=Mode.SUBTRACT)

    # Sketch20 → Boss-Extrude10 (add)
    with BuildSketch(Plane.XZ):
        Polygon((65.183134159, 56.81619153), (67.170029675, 54.560446359), (62.220282207, 49.610698891), (60.233386691, 51.866444062), align=None)
    extrude(amount=BOSS_EXTRUDE10_DEPTH)

    # Sketch21 → Cut-Extrude15 (cut)
    with BuildSketch(Plane(origin=(6.304791658, 0, -6.304791658), x_dir=(-0.7071067811865461, 0, -0.707106781186549), z_dir=(0.707106781186549, 0, -0.7071067811865461))):
        with Locations((-82.576445081, -4.5)):
            Circle(SKETCH21_R)
    extrude(amount=-CUT_EXTRUDE15_DEPTH, mode=Mode.SUBTRACT)

    # Fillet8
    # the kernel refuses this fillet: 3.5 mm, written as the material it takes off along each edge
    with BuildSketch(Plane(origin=(59.399622631, -7, 63.382278219), x_dir=(0, 1, 0), z_dir=(0.6609727460873192, 0, -0.7504099072705454)), Plane(origin=(68.003793735, -7, 43.044612202), x_dir=(0, 1, 0), z_dir=(-0.6609727460873219, 0, 0.7504099072705428))) as fillet8_piece_1:
        with BuildLine():
            CenterArc((FILLET8_R, -FILLET8_R), FILLET8_R, 90, 90)
            Line((0, -FILLET8_R), (0, 0))
            Line((0, 0), (FILLET8_R, 0))
        make_face()
    extrude(amount=20.50601731, mode=Mode.SUBTRACT)

    # Sketch24 → Boss-Extrude13 (add)
    with BuildSketch(Plane(origin=(0.23864693, 4.674300528, 0.23864693), x_dir=(-0.9987026054822318, 0.05085630859006412, 0.002596474454724954), z_dir=(-0.05092254709852865, -0.9974035233515052, -0.050922547098528656))):
        Polygon((-43.139964089, -30.785960317), (-41.021401305, -32.904523102), (-38.900080962, -30.783202758), (-41.021401305, -28.661882414), align=None)
    extrude(amount=BOSS_EXTRUDE13_DEPTH)

    # Sketch25 → Cut-Extrude16 (cut)
    with BuildSketch(Plane(origin=(6.22504574, 0, -6.22504574), x_dir=(-0.7071067811865479, 0, -0.7071067811865471), z_dir=(0.7071067811865471, 0, -0.7071067811865479))):
        with BuildLine():
            Line((-49.919303237, -1.47486047), (-49.338024072, -0.72486047))
            Line((-49.338024072, -0.72486047), (-49.410226901, 0.27513953))
            Line((-49.410226901, 0.27513953), (-50.242592935, -0.798827271))
            ThreePointArc((-50.242592935, -0.798827271), (-51.571270298, -1.849539371), (-49.919303237, -1.47486047))
        make_face()
    extrude(amount=-CUT_EXTRUDE16_DEPTH, mode=Mode.SUBTRACT)

    # Sketch26 → Cut-Extrude18 (cut)
    with BuildSketch(Plane(origin=(6.22504574, 0, -6.22504574), x_dir=(-0.7071067811865479, 0, -0.7071067811865471), z_dir=(0.7071067811865471, 0, -0.7071067811865479))):
        Polygon((-53.17088521, -2.605184508), (-47.853660079, -2.824654594), (-48.053771996, -4.778906076), (-52.998057051, -4.922262957), align=None)
    extrude(amount=-CUT_EXTRUDE18_DEPTH, mode=Mode.SUBTRACT)

    # Fillet10
    fillet10_edges = [part.edges().sort_by_distance(p)[0] for p in [
        (39.94863606, -2.769399449, 29.619863131),
        (42.083214828, -2.644880095, 31.751684343),
    ]]
    fillet(fillet10_edges, radius=FILLET10_R)

    # Sketch27 → Boss-Extrude14 (add)
    with BuildSketch(Plane.ZY.offset(-7.166666667).offset(BOSS_EXTRUDE14_START)):
        with Locations((-35.666666667, 15)):
            Rectangle(SKETCH27_W, SKETCH27_H)
        with Locations((-38.166666667, 21)):
            Circle(SKETCH27_R, mode=Mode.SUBTRACT)
        with Locations((-38.166666667, 8.5)):
            Circle(SKETCH27_R, mode=Mode.SUBTRACT)
    extrude(amount=-BOSS_EXTRUDE14_DEPTH)

    # Sketch28 → Boss-Extrude15 (add)
    with BuildSketch(Plane(origin=(0, 0, -3.166666667), x_dir=(-1, 0, 0), z_dir=(0, 0, -1)).offset(BOSS_EXTRUDE15_START)):
        with Locations((15.333333333, 15)):
            Rectangle(SKETCH28_W, SKETCH28_H)
        with Locations((17.833333333, 21)):
            Circle(SKETCH28_R, mode=Mode.SUBTRACT)
        with Locations((17.833333333, 8.5)):
            Circle(SKETCH28_R, mode=Mode.SUBTRACT)
    extrude(amount=-BOSS_EXTRUDE15_DEPTH)

    # Sketch29 → Boss-Extrude16 (add)
    with BuildSketch(Plane(origin=(0, 25, 0), x_dir=(1, 0, 0), z_dir=(0, 1, 0))):
        Polygon((7.166666667, 28.166666667), (-7.833333333, 3.166666667), (-7.833333333, 4.166666667), (6.166666667, 28.166666667), align=None)
    extrude(amount=-BOSS_EXTRUDE16_DEPTH)

    # Fillet11
    fillet11_edges = [part.edges().sort_by_distance(p)[0] for p in [
        (6.166666667, 15, -28.166666667),
        (-7.833333333, 15, -4.166666667),
    ]]
    fillet(fillet11_edges, radius=FILLET11_R)


solid = part.part
